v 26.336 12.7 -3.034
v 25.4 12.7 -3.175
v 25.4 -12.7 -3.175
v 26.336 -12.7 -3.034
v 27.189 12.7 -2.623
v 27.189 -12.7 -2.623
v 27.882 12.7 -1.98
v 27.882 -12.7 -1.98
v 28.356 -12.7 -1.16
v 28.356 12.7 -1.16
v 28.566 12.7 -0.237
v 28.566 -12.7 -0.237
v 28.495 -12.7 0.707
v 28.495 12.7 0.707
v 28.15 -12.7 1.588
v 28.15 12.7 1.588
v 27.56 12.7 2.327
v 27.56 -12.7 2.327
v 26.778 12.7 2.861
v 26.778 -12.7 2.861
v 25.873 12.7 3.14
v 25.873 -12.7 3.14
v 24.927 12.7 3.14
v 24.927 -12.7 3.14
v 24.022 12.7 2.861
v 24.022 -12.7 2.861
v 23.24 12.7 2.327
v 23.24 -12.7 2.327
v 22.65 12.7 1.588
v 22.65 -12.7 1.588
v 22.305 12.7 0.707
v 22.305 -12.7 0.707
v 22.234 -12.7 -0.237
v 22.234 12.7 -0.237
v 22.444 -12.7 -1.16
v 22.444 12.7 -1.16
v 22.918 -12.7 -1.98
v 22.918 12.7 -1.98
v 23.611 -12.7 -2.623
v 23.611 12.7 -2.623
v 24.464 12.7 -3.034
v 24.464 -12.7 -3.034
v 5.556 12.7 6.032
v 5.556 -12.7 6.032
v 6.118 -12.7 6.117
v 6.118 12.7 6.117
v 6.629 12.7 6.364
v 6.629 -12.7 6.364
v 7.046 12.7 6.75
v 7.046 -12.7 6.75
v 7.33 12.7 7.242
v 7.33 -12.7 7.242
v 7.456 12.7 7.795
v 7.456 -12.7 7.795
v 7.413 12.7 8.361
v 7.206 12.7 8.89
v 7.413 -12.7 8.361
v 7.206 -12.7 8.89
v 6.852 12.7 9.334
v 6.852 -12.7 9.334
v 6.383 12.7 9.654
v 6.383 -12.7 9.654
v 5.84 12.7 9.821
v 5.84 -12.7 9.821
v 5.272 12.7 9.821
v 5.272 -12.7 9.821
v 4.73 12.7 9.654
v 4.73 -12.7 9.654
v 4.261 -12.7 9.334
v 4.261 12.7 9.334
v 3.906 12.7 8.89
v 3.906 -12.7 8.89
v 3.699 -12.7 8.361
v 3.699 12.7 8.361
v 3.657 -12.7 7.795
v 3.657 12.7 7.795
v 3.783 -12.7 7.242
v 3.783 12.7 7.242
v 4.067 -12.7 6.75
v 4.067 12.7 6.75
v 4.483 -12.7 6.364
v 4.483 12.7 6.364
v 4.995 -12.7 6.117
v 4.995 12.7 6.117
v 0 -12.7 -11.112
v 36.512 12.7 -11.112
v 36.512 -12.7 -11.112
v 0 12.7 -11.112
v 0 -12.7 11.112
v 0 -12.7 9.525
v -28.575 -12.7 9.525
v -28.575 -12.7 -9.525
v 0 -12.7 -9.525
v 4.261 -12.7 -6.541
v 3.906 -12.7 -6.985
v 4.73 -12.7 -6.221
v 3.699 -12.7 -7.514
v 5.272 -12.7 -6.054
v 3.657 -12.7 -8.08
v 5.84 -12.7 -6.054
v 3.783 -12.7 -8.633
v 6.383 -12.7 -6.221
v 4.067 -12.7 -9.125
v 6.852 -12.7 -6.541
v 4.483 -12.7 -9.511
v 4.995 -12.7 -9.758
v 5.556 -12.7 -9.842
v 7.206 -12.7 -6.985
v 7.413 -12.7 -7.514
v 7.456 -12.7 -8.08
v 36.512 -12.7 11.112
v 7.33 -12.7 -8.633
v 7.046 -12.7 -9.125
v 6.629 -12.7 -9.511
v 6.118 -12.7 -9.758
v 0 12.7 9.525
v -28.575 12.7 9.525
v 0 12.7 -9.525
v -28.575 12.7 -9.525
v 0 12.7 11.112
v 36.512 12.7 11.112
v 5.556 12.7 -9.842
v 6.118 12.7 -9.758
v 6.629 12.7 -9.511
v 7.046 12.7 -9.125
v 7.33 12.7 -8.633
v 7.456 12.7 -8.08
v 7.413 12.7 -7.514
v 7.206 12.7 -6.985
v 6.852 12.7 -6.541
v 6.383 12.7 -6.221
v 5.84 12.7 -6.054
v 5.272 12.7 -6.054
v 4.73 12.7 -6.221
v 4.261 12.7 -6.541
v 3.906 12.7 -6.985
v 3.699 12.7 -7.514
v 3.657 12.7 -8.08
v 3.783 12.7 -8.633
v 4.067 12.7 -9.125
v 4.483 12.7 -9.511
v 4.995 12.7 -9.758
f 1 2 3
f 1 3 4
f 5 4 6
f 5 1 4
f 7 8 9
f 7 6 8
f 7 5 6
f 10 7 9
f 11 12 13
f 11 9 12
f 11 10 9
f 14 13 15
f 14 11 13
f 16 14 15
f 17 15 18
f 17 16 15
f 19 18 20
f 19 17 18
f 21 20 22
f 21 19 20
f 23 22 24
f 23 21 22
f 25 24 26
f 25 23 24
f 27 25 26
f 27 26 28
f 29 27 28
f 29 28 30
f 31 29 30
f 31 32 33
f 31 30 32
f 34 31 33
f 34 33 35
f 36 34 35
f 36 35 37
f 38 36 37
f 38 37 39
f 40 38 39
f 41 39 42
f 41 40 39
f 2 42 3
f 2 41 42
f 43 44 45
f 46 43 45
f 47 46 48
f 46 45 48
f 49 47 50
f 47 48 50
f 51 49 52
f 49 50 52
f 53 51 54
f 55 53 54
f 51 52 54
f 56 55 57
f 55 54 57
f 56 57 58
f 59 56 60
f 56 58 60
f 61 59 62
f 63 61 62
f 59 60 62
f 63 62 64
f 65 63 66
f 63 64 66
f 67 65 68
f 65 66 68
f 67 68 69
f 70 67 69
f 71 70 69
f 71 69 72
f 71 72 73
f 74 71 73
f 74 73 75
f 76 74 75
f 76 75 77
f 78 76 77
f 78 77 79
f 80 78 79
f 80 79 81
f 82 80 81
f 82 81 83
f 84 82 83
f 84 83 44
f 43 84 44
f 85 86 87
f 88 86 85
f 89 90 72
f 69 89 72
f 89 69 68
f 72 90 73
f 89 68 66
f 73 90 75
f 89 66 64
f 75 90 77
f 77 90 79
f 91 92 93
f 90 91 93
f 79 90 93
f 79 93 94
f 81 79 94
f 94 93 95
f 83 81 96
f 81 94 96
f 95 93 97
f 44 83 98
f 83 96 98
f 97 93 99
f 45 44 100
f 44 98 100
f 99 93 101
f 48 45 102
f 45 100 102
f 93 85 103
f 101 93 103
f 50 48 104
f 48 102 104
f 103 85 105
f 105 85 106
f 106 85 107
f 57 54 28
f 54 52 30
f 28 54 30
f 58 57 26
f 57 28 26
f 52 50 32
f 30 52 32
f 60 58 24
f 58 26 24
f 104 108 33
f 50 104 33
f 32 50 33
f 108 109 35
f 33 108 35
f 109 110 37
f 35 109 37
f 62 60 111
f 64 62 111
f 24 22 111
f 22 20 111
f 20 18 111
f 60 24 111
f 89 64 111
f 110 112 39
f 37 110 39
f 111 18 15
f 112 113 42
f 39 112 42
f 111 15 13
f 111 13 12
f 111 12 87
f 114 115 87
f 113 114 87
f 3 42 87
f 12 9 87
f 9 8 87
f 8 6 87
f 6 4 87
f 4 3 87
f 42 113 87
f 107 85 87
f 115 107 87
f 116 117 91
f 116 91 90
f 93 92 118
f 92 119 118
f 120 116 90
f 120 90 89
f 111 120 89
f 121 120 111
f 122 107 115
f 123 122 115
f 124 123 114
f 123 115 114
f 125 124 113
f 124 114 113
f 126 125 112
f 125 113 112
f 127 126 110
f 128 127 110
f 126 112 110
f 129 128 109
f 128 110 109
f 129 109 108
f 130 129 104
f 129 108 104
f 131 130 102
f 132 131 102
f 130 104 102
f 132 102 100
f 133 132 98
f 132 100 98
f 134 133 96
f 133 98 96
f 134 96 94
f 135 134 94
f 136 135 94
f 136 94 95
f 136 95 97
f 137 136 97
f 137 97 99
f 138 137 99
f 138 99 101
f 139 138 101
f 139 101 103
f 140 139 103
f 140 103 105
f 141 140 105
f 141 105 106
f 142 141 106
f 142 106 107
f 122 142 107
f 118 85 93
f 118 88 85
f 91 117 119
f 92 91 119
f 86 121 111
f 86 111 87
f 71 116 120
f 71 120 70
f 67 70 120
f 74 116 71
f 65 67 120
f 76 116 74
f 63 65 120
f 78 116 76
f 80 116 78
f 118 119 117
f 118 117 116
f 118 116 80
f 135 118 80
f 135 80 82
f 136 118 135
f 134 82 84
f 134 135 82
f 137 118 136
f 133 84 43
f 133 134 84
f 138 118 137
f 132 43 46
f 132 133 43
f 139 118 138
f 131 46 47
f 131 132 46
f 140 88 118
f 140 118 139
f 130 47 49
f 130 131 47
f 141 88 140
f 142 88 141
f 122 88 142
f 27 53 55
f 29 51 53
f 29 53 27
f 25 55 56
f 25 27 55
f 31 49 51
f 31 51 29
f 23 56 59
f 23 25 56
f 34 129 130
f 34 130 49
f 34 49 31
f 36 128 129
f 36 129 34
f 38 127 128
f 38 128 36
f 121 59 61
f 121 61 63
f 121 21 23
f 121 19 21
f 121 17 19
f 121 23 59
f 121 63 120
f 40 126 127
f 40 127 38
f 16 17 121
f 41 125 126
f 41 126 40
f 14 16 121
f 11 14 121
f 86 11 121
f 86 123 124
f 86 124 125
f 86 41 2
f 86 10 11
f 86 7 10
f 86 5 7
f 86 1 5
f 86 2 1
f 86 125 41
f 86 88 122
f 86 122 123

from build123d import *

# Parameters (mm, degrees)
SKETCH1_W               = 28.575
SKETCH1_H               = 19.05
BOSS_EXTRUDE1_DEPTH     = 12.7
SKETCH3_R               = 1.905
CUT_EXTRUDE1_DEPTH      = 46.845504823
CUT_EXTRUDE4_DEPTH      = 41.223628783
CUT_EXTRUDE4_DEPTH_BACK = 41.223628783
SKETCH2_R               = 3.175


with BuildPart() as part:
    # Sketch1 → Boss-Extrude1 (new, symmetric)
    with BuildSketch(Plane(origin=(0, 0, 0), x_dir=(1, 0, 0), z_dir=(0, 1, 0))):
        with Locations((-14.2875, 0)):
            Rectangle(SKETCH1_W, SKETCH1_H)
        Polygon((0, 9.525), (0, -9.525), (0, -11.1125), (36.5125, -11.1125), (36.5125, 11.1125), (0, 11.1125), align=None)
    extrude(amount=BOSS_EXTRUDE1_DEPTH, both=True)

    # Sketch3 → Cut-Extrude1 (cut, through all)
    with BuildSketch(Plane.XZ.offset(12.7)):
        with Locations(Location((5.55625, 7.9375, 0), (0, 0, 270))):
            Circle(SKETCH3_R)
        with Locations(Location((5.55625, -7.9375, 0), (0, 0, 270))):
            Circle(SKETCH3_R)
    extrude(amount=-CUT_EXTRUDE1_DEPTH, mode=Mode.SUBTRACT)

    # Sketch2 → Cut-Extrude4 (cut, two sides: drawn at the far end of the back side and taken through both)
    with BuildSketch(Plane.XZ.offset(-CUT_EXTRUDE4_DEPTH_BACK)):
        with Locations(Location((25.4, 0, 0), (0, 0, 270))):
            Circle(SKETCH2_R)
    extrude(amount=CUT_EXTRUDE4_DEPTH + CUT_EXTRUDE4_DEPTH_BACK, mode=Mode.SUBTRACT)


solid = part.part
